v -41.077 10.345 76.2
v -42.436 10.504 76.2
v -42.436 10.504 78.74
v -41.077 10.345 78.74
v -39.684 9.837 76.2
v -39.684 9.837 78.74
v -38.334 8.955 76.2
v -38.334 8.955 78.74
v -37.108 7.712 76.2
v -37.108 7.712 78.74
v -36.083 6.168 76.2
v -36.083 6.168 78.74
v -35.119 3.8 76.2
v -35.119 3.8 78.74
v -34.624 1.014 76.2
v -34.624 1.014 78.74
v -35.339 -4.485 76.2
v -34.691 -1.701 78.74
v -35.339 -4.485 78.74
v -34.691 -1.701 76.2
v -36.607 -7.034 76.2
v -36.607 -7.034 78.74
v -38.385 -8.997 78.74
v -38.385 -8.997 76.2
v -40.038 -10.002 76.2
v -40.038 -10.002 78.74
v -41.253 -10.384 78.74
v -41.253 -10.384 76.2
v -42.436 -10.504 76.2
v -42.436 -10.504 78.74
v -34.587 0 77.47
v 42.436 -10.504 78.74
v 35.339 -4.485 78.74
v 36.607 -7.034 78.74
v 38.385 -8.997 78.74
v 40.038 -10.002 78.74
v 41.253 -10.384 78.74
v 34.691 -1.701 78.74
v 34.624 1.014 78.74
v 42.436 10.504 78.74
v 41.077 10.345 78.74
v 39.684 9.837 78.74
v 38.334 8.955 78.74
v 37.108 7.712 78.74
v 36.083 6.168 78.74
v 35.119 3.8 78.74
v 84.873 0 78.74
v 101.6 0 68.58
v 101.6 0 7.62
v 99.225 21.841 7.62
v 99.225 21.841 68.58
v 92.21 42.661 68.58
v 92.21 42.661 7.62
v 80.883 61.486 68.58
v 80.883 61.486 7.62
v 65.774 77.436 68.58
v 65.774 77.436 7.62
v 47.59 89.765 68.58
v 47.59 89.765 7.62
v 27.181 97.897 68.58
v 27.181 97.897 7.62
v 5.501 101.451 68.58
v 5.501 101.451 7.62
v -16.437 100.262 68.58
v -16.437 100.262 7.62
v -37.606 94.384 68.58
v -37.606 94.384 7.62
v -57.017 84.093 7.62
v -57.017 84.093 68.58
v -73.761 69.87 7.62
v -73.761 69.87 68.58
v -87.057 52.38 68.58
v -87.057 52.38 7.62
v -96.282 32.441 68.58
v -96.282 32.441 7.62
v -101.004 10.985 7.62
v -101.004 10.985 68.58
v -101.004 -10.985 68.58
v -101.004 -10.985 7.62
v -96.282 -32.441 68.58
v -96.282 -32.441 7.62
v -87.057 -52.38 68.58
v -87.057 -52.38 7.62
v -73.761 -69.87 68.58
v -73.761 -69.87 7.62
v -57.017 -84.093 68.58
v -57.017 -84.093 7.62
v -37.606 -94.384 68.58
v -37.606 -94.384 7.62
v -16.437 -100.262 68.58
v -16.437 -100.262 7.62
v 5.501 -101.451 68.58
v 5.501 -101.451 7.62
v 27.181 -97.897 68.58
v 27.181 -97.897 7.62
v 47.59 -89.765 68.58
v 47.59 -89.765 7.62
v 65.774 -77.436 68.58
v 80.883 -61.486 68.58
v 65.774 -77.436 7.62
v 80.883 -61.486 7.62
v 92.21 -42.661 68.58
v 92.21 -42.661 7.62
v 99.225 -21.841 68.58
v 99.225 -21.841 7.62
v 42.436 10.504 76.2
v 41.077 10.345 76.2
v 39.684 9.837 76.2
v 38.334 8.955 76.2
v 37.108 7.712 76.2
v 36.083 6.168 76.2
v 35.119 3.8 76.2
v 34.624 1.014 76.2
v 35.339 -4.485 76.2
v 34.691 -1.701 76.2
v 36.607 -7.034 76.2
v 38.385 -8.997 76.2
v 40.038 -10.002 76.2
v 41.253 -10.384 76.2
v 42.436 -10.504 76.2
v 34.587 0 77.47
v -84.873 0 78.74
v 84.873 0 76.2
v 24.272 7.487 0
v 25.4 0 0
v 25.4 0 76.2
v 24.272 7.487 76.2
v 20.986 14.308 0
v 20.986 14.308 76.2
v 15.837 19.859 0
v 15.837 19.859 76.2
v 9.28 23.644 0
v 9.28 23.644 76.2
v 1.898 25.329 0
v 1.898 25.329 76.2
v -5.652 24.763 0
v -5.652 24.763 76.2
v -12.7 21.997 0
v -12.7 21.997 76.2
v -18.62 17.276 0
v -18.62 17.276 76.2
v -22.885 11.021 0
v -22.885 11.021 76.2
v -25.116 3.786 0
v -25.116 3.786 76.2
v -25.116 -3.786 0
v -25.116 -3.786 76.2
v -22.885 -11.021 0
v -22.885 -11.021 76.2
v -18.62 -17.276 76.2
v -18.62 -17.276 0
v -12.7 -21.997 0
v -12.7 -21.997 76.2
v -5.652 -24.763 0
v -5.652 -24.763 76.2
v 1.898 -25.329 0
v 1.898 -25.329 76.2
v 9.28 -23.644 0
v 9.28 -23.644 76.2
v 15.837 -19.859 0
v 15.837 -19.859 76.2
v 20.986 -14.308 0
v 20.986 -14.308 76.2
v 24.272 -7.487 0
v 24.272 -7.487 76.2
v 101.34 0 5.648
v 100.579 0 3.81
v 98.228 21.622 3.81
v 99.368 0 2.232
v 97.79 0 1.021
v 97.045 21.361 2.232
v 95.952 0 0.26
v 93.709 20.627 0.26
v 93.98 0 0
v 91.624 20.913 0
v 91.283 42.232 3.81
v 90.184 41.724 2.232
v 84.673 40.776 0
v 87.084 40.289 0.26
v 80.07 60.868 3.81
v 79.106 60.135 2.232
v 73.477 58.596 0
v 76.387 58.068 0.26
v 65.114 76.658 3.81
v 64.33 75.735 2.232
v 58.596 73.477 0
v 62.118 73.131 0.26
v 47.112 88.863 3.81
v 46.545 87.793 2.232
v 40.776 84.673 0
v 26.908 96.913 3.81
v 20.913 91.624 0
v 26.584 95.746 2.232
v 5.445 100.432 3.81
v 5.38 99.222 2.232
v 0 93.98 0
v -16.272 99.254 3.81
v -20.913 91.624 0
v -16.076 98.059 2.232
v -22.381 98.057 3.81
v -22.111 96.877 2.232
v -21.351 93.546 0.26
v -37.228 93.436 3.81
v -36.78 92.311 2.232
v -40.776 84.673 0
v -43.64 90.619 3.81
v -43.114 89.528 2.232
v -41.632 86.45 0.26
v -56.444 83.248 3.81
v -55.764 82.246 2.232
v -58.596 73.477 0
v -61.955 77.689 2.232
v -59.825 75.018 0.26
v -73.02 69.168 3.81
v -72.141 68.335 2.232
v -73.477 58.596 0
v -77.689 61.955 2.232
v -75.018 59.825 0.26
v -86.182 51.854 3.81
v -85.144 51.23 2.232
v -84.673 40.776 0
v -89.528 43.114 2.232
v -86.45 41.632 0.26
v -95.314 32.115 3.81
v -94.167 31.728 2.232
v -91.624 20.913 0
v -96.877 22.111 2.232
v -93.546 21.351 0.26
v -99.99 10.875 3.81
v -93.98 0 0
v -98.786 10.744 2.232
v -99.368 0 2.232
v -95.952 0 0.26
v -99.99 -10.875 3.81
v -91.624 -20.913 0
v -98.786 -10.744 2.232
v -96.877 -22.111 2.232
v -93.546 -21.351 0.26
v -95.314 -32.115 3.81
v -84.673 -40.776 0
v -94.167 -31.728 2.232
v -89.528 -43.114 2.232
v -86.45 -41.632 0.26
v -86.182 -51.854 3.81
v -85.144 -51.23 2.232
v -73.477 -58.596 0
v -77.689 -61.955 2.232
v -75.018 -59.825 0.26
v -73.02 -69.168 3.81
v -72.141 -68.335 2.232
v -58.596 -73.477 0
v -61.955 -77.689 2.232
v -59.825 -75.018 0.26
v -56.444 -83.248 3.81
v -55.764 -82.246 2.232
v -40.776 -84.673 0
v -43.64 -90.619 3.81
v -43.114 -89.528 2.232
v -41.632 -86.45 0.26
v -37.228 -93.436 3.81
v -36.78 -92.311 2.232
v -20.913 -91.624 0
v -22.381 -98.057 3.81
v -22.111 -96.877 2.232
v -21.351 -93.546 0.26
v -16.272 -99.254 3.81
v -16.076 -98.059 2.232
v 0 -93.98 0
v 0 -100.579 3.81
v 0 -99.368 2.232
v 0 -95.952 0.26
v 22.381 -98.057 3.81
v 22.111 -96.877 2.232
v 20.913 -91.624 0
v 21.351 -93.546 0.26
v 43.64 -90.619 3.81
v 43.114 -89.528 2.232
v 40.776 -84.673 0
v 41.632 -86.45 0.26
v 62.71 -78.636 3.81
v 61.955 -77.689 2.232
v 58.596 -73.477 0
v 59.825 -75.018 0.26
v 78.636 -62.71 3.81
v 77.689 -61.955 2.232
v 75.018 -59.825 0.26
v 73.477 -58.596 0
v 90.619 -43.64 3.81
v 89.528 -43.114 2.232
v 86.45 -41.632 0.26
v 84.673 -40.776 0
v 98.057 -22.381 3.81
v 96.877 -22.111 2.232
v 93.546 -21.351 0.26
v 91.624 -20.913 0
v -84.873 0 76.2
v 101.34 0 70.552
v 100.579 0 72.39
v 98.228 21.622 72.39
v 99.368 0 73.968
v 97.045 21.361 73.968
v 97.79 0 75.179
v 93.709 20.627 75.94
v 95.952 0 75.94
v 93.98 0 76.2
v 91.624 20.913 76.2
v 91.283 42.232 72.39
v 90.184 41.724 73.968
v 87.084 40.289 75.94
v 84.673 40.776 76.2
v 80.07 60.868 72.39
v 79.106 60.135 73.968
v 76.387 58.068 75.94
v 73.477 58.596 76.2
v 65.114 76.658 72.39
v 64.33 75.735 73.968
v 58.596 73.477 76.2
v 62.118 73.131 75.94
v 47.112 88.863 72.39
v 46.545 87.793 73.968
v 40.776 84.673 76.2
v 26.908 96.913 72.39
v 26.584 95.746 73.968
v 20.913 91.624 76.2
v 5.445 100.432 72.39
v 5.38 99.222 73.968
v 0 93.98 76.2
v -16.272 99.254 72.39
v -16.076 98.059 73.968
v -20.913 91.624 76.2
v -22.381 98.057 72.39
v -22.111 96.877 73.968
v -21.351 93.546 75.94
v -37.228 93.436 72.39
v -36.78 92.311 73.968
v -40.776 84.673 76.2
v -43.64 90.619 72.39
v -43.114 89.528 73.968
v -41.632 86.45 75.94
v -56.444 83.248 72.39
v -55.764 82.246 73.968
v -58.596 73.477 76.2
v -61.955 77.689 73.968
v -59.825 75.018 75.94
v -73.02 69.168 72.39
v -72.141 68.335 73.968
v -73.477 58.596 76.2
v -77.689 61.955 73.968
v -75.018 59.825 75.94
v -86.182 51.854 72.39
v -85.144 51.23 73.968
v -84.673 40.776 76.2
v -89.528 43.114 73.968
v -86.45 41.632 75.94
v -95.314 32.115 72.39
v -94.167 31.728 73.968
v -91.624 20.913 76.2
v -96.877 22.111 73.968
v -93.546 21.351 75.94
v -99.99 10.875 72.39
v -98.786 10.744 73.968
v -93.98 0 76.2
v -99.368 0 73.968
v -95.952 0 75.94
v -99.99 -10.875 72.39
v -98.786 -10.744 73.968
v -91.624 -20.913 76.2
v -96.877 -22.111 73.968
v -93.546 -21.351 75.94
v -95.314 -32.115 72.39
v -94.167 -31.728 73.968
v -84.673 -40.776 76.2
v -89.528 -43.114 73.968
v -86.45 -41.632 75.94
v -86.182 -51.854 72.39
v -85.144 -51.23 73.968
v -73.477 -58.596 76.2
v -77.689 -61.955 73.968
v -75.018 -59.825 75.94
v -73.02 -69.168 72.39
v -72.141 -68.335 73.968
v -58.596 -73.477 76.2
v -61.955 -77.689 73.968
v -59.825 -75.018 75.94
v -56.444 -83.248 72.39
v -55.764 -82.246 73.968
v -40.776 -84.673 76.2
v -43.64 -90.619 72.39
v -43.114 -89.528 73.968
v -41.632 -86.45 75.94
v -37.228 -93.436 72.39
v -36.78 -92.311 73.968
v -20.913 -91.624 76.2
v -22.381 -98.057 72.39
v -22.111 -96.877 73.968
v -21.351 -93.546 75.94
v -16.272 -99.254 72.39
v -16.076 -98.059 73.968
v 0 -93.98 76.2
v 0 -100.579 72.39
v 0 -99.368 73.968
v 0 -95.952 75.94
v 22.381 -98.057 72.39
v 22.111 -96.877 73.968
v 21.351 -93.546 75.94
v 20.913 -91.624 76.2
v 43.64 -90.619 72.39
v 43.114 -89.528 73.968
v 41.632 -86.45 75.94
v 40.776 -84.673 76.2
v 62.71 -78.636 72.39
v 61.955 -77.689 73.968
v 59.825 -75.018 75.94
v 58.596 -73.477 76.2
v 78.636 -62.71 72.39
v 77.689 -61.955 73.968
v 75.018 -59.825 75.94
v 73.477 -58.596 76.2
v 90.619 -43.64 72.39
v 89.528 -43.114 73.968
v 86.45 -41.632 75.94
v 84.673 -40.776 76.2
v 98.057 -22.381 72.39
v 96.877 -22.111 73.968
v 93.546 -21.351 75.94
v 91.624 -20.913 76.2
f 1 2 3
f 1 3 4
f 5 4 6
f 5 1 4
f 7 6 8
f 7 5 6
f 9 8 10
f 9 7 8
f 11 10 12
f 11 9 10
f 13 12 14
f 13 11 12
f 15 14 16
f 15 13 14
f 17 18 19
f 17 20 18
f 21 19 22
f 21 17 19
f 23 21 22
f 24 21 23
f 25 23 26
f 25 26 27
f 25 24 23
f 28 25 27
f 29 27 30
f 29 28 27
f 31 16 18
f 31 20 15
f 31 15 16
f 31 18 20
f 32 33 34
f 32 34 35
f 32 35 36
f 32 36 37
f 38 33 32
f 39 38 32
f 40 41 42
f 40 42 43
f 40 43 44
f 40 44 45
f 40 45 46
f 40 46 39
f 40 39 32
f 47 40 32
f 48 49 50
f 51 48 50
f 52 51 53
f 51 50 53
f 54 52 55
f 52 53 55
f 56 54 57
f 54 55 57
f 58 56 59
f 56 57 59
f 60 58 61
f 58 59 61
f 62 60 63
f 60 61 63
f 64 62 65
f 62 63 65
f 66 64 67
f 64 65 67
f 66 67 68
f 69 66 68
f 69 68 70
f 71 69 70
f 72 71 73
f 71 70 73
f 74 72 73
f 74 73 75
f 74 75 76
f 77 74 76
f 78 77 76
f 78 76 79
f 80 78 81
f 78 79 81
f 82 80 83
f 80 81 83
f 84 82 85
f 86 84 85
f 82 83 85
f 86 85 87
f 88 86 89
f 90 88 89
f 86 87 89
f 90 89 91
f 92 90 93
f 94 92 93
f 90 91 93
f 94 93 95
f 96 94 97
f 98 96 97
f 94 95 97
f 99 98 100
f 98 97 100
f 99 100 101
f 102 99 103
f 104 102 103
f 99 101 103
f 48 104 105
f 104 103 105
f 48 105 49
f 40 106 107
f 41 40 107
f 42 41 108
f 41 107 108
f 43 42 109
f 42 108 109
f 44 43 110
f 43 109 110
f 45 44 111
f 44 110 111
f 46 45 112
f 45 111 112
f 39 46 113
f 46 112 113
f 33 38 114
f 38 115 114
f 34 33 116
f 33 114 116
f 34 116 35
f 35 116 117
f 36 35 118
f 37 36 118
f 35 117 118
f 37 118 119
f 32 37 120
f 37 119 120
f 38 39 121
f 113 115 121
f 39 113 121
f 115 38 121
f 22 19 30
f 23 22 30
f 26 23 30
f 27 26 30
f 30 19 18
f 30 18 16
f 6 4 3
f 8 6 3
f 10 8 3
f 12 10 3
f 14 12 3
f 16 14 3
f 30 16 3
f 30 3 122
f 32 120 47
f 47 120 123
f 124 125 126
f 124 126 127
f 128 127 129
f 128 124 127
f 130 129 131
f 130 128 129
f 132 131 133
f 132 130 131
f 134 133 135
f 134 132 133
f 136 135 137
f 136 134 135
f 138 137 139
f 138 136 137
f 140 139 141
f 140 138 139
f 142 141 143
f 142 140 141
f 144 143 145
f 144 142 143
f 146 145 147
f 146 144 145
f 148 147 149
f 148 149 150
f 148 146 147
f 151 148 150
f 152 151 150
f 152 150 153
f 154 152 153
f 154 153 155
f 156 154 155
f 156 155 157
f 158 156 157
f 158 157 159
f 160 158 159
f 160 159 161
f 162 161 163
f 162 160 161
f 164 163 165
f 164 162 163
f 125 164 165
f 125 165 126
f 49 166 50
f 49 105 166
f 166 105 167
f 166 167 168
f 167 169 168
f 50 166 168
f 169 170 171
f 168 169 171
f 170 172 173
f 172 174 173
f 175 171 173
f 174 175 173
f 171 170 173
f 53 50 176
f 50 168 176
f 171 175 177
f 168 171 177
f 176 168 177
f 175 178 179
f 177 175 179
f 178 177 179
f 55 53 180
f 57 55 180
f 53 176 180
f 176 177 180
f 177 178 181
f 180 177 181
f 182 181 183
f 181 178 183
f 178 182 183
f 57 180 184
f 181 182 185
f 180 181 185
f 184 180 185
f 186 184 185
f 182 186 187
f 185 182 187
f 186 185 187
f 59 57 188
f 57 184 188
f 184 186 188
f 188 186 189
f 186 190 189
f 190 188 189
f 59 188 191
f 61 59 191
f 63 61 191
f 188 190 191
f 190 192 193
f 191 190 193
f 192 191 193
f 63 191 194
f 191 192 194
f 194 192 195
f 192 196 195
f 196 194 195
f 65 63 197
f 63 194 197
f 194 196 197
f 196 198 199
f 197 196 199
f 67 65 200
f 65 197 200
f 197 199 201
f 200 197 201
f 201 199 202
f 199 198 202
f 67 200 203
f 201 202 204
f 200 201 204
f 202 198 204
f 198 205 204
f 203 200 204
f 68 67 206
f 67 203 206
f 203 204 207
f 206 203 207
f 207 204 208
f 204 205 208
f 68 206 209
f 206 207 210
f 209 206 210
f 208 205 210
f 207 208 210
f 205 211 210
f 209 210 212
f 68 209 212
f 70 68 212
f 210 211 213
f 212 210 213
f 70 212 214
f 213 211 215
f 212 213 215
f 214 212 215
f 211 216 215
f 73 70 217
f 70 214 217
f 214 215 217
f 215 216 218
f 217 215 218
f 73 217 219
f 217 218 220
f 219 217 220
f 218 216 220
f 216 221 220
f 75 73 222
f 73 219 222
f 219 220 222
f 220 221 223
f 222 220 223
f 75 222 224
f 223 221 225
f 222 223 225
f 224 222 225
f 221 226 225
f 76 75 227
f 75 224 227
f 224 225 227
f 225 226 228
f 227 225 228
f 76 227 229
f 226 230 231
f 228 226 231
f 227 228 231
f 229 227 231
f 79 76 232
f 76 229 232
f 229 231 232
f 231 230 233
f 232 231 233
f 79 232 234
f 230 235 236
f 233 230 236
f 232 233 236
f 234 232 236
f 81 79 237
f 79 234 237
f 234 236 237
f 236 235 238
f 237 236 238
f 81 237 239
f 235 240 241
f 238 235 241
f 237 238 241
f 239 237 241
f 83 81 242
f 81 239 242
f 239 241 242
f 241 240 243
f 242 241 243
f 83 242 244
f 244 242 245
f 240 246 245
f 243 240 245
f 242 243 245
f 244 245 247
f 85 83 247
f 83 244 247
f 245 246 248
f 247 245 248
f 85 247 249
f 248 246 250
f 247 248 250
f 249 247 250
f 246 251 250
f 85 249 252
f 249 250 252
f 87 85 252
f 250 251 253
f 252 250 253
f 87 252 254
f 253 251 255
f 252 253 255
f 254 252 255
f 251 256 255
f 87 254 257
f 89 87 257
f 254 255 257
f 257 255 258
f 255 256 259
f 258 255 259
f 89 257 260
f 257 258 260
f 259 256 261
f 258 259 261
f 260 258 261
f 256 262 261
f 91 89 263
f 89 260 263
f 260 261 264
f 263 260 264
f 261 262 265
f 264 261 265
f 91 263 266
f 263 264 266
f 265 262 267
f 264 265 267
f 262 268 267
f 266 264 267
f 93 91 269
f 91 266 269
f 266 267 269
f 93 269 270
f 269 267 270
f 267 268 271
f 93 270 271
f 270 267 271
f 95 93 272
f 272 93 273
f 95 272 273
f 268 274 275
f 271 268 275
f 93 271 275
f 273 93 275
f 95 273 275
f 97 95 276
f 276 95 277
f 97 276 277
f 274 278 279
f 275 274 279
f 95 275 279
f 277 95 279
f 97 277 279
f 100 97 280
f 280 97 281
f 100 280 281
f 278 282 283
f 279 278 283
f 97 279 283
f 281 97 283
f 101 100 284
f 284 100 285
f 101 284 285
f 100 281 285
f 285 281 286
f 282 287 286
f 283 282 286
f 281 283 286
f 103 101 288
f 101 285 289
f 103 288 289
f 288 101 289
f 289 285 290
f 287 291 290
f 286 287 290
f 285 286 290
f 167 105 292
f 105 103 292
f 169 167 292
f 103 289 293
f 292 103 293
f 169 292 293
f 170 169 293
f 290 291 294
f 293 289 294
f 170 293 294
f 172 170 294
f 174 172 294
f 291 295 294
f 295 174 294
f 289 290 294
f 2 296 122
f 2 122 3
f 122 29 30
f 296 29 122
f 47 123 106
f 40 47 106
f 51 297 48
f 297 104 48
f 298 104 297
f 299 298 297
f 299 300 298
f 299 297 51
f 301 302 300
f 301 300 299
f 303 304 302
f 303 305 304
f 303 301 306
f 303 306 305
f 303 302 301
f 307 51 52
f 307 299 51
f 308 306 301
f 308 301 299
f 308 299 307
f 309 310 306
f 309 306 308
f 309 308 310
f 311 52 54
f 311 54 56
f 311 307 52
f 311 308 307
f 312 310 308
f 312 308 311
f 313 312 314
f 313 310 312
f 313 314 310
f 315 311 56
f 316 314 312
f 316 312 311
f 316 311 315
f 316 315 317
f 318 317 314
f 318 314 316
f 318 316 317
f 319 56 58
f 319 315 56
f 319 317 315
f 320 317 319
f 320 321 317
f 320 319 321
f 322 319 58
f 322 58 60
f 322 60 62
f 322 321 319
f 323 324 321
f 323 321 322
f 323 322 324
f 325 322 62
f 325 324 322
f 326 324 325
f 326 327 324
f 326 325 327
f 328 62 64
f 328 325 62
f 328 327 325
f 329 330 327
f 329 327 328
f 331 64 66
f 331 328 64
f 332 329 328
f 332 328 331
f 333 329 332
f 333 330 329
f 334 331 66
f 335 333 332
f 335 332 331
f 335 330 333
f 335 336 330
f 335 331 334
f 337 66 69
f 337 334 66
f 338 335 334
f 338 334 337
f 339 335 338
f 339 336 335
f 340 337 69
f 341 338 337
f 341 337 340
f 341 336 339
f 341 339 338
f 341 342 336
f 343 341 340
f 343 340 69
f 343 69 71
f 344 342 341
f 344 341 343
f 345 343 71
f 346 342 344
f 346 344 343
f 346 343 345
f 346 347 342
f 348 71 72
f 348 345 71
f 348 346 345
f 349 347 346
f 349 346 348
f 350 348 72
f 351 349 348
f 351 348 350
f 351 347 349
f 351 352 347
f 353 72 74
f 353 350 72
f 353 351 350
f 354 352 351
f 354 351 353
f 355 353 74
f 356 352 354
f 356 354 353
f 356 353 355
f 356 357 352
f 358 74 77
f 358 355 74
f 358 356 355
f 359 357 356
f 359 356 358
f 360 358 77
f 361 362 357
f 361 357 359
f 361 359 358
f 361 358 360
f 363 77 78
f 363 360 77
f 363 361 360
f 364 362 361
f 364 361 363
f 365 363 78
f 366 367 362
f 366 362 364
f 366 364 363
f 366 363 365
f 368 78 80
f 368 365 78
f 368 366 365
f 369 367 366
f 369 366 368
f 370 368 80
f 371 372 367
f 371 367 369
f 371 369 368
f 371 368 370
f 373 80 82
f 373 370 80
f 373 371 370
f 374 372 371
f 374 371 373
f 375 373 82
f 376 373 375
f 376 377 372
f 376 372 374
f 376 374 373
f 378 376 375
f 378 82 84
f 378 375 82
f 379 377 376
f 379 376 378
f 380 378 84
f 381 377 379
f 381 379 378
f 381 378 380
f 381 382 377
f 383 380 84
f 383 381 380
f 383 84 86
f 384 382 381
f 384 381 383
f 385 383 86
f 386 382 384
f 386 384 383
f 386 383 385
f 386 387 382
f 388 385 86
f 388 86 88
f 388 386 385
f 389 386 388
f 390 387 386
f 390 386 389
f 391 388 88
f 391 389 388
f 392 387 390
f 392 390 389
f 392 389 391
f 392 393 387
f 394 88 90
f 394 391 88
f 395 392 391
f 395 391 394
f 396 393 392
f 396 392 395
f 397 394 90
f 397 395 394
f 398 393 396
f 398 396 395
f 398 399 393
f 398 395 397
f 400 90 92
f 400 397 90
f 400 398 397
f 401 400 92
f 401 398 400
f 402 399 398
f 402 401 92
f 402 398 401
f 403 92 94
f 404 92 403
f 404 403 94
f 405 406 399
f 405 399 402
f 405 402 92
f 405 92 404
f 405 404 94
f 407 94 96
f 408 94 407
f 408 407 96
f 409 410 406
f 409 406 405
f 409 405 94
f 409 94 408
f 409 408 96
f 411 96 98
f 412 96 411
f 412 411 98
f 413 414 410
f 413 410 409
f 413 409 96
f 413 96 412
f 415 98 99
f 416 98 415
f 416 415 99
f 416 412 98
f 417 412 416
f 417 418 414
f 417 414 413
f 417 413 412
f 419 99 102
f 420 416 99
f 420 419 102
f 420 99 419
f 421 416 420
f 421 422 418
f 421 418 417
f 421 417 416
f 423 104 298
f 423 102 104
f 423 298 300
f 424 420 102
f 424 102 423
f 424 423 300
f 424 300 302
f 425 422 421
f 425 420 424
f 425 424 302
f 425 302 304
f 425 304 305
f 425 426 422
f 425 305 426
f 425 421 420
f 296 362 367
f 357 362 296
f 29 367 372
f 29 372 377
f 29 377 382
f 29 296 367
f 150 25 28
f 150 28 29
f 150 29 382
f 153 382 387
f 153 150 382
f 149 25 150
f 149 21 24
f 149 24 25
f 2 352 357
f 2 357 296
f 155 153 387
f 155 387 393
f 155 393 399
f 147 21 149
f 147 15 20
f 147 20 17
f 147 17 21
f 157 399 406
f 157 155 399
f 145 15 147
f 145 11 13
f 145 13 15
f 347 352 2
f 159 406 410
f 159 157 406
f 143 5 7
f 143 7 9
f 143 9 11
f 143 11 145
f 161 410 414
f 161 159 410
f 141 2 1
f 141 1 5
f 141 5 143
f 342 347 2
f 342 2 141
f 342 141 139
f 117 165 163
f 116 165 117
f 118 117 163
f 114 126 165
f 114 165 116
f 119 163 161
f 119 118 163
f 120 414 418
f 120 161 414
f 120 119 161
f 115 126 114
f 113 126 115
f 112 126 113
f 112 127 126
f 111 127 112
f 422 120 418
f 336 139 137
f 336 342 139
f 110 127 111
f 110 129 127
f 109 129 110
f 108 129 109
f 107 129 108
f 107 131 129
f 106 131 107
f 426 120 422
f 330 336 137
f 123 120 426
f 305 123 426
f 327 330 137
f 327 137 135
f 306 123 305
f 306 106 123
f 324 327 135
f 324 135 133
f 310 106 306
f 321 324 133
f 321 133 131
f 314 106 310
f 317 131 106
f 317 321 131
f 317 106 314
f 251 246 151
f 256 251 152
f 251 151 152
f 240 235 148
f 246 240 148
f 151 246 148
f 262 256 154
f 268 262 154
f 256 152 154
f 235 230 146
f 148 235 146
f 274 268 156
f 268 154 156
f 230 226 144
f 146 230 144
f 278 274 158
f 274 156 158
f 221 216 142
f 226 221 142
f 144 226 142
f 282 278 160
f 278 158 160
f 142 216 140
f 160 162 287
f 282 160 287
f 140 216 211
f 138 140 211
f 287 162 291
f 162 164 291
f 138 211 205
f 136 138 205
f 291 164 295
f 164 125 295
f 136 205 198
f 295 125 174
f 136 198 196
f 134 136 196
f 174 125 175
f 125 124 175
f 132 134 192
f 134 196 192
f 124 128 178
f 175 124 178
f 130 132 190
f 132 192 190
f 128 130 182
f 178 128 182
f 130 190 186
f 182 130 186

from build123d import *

# Parameters (mm, degrees)
SKETCH1_R           = 101.6
SKETCH1_R_2         = 25.4
BOSS_EXTRUDE1_DEPTH = 76.2
FILLET1_R           = 7.62
BOSS_EXTRUDE2_DEPTH = 2.54


with BuildPart() as part:
    # Sketch1 → Boss-Extrude1 (new body)
    with BuildSketch(Plane.XY):
        Circle(SKETCH1_R)
        Circle(SKETCH1_R_2, mode=Mode.SUBTRACT)
    extrude(amount=BOSS_EXTRUDE1_DEPTH)

    # Fillet1
    fillet1_edges = [part.edges().sort_by_distance(p)[0] for p in [
        (-101.6, 0, 0),
        (-101.6, 0, 76.2),
    ]]
    fillet(fillet1_edges, radius=FILLET1_R)

    # Sketch2 → Boss-Extrude2 (add)
    with BuildSketch(Plane.XY.offset(76.2)):
        with BuildLine():
            add(Edge.make_bspline(
                [(42.436322164, 10.50404014), (34.587368685, 10.50404014), (34.587368685, 0)],
                knots=[0, 0, 0, 1.570796327, 1.570796327, 1.570796327], degree=2, weights=[1, 0.707106781, 1]))
            Line((34.587368685, 0), (84.872644329, 0))
            Line((84.872644329, 0), (42.436322164, 10.50404014))
        make_face()
        with BuildLine():
            Line((84.872644329, 0), (34.587368685, 0))
            add(Edge.make_bspline(
                [(34.587368685, 0), (34.587368685, -10.50404014), (42.436322164, -10.50404014)],
                knots=[1.570796327, 1.570796327, 1.570796327, 3.141592654, 3.141592654, 3.141592654], degree=2, weights=[1, 0.707106781, 1]))
            Line((42.436322164, -10.50404014), (84.872644329, 0))
        make_face()
    boss_extrude2 = extrude(amount=BOSS_EXTRUDE2_DEPTH)

    # Mirror1: Boss-Extrude2 across plane
    add(boss_extrude2.mirror(Plane(origin=(0, 0, 0), x_dir=(0, 0, 1), z_dir=(1, 0, 0))))


solid = part.part
